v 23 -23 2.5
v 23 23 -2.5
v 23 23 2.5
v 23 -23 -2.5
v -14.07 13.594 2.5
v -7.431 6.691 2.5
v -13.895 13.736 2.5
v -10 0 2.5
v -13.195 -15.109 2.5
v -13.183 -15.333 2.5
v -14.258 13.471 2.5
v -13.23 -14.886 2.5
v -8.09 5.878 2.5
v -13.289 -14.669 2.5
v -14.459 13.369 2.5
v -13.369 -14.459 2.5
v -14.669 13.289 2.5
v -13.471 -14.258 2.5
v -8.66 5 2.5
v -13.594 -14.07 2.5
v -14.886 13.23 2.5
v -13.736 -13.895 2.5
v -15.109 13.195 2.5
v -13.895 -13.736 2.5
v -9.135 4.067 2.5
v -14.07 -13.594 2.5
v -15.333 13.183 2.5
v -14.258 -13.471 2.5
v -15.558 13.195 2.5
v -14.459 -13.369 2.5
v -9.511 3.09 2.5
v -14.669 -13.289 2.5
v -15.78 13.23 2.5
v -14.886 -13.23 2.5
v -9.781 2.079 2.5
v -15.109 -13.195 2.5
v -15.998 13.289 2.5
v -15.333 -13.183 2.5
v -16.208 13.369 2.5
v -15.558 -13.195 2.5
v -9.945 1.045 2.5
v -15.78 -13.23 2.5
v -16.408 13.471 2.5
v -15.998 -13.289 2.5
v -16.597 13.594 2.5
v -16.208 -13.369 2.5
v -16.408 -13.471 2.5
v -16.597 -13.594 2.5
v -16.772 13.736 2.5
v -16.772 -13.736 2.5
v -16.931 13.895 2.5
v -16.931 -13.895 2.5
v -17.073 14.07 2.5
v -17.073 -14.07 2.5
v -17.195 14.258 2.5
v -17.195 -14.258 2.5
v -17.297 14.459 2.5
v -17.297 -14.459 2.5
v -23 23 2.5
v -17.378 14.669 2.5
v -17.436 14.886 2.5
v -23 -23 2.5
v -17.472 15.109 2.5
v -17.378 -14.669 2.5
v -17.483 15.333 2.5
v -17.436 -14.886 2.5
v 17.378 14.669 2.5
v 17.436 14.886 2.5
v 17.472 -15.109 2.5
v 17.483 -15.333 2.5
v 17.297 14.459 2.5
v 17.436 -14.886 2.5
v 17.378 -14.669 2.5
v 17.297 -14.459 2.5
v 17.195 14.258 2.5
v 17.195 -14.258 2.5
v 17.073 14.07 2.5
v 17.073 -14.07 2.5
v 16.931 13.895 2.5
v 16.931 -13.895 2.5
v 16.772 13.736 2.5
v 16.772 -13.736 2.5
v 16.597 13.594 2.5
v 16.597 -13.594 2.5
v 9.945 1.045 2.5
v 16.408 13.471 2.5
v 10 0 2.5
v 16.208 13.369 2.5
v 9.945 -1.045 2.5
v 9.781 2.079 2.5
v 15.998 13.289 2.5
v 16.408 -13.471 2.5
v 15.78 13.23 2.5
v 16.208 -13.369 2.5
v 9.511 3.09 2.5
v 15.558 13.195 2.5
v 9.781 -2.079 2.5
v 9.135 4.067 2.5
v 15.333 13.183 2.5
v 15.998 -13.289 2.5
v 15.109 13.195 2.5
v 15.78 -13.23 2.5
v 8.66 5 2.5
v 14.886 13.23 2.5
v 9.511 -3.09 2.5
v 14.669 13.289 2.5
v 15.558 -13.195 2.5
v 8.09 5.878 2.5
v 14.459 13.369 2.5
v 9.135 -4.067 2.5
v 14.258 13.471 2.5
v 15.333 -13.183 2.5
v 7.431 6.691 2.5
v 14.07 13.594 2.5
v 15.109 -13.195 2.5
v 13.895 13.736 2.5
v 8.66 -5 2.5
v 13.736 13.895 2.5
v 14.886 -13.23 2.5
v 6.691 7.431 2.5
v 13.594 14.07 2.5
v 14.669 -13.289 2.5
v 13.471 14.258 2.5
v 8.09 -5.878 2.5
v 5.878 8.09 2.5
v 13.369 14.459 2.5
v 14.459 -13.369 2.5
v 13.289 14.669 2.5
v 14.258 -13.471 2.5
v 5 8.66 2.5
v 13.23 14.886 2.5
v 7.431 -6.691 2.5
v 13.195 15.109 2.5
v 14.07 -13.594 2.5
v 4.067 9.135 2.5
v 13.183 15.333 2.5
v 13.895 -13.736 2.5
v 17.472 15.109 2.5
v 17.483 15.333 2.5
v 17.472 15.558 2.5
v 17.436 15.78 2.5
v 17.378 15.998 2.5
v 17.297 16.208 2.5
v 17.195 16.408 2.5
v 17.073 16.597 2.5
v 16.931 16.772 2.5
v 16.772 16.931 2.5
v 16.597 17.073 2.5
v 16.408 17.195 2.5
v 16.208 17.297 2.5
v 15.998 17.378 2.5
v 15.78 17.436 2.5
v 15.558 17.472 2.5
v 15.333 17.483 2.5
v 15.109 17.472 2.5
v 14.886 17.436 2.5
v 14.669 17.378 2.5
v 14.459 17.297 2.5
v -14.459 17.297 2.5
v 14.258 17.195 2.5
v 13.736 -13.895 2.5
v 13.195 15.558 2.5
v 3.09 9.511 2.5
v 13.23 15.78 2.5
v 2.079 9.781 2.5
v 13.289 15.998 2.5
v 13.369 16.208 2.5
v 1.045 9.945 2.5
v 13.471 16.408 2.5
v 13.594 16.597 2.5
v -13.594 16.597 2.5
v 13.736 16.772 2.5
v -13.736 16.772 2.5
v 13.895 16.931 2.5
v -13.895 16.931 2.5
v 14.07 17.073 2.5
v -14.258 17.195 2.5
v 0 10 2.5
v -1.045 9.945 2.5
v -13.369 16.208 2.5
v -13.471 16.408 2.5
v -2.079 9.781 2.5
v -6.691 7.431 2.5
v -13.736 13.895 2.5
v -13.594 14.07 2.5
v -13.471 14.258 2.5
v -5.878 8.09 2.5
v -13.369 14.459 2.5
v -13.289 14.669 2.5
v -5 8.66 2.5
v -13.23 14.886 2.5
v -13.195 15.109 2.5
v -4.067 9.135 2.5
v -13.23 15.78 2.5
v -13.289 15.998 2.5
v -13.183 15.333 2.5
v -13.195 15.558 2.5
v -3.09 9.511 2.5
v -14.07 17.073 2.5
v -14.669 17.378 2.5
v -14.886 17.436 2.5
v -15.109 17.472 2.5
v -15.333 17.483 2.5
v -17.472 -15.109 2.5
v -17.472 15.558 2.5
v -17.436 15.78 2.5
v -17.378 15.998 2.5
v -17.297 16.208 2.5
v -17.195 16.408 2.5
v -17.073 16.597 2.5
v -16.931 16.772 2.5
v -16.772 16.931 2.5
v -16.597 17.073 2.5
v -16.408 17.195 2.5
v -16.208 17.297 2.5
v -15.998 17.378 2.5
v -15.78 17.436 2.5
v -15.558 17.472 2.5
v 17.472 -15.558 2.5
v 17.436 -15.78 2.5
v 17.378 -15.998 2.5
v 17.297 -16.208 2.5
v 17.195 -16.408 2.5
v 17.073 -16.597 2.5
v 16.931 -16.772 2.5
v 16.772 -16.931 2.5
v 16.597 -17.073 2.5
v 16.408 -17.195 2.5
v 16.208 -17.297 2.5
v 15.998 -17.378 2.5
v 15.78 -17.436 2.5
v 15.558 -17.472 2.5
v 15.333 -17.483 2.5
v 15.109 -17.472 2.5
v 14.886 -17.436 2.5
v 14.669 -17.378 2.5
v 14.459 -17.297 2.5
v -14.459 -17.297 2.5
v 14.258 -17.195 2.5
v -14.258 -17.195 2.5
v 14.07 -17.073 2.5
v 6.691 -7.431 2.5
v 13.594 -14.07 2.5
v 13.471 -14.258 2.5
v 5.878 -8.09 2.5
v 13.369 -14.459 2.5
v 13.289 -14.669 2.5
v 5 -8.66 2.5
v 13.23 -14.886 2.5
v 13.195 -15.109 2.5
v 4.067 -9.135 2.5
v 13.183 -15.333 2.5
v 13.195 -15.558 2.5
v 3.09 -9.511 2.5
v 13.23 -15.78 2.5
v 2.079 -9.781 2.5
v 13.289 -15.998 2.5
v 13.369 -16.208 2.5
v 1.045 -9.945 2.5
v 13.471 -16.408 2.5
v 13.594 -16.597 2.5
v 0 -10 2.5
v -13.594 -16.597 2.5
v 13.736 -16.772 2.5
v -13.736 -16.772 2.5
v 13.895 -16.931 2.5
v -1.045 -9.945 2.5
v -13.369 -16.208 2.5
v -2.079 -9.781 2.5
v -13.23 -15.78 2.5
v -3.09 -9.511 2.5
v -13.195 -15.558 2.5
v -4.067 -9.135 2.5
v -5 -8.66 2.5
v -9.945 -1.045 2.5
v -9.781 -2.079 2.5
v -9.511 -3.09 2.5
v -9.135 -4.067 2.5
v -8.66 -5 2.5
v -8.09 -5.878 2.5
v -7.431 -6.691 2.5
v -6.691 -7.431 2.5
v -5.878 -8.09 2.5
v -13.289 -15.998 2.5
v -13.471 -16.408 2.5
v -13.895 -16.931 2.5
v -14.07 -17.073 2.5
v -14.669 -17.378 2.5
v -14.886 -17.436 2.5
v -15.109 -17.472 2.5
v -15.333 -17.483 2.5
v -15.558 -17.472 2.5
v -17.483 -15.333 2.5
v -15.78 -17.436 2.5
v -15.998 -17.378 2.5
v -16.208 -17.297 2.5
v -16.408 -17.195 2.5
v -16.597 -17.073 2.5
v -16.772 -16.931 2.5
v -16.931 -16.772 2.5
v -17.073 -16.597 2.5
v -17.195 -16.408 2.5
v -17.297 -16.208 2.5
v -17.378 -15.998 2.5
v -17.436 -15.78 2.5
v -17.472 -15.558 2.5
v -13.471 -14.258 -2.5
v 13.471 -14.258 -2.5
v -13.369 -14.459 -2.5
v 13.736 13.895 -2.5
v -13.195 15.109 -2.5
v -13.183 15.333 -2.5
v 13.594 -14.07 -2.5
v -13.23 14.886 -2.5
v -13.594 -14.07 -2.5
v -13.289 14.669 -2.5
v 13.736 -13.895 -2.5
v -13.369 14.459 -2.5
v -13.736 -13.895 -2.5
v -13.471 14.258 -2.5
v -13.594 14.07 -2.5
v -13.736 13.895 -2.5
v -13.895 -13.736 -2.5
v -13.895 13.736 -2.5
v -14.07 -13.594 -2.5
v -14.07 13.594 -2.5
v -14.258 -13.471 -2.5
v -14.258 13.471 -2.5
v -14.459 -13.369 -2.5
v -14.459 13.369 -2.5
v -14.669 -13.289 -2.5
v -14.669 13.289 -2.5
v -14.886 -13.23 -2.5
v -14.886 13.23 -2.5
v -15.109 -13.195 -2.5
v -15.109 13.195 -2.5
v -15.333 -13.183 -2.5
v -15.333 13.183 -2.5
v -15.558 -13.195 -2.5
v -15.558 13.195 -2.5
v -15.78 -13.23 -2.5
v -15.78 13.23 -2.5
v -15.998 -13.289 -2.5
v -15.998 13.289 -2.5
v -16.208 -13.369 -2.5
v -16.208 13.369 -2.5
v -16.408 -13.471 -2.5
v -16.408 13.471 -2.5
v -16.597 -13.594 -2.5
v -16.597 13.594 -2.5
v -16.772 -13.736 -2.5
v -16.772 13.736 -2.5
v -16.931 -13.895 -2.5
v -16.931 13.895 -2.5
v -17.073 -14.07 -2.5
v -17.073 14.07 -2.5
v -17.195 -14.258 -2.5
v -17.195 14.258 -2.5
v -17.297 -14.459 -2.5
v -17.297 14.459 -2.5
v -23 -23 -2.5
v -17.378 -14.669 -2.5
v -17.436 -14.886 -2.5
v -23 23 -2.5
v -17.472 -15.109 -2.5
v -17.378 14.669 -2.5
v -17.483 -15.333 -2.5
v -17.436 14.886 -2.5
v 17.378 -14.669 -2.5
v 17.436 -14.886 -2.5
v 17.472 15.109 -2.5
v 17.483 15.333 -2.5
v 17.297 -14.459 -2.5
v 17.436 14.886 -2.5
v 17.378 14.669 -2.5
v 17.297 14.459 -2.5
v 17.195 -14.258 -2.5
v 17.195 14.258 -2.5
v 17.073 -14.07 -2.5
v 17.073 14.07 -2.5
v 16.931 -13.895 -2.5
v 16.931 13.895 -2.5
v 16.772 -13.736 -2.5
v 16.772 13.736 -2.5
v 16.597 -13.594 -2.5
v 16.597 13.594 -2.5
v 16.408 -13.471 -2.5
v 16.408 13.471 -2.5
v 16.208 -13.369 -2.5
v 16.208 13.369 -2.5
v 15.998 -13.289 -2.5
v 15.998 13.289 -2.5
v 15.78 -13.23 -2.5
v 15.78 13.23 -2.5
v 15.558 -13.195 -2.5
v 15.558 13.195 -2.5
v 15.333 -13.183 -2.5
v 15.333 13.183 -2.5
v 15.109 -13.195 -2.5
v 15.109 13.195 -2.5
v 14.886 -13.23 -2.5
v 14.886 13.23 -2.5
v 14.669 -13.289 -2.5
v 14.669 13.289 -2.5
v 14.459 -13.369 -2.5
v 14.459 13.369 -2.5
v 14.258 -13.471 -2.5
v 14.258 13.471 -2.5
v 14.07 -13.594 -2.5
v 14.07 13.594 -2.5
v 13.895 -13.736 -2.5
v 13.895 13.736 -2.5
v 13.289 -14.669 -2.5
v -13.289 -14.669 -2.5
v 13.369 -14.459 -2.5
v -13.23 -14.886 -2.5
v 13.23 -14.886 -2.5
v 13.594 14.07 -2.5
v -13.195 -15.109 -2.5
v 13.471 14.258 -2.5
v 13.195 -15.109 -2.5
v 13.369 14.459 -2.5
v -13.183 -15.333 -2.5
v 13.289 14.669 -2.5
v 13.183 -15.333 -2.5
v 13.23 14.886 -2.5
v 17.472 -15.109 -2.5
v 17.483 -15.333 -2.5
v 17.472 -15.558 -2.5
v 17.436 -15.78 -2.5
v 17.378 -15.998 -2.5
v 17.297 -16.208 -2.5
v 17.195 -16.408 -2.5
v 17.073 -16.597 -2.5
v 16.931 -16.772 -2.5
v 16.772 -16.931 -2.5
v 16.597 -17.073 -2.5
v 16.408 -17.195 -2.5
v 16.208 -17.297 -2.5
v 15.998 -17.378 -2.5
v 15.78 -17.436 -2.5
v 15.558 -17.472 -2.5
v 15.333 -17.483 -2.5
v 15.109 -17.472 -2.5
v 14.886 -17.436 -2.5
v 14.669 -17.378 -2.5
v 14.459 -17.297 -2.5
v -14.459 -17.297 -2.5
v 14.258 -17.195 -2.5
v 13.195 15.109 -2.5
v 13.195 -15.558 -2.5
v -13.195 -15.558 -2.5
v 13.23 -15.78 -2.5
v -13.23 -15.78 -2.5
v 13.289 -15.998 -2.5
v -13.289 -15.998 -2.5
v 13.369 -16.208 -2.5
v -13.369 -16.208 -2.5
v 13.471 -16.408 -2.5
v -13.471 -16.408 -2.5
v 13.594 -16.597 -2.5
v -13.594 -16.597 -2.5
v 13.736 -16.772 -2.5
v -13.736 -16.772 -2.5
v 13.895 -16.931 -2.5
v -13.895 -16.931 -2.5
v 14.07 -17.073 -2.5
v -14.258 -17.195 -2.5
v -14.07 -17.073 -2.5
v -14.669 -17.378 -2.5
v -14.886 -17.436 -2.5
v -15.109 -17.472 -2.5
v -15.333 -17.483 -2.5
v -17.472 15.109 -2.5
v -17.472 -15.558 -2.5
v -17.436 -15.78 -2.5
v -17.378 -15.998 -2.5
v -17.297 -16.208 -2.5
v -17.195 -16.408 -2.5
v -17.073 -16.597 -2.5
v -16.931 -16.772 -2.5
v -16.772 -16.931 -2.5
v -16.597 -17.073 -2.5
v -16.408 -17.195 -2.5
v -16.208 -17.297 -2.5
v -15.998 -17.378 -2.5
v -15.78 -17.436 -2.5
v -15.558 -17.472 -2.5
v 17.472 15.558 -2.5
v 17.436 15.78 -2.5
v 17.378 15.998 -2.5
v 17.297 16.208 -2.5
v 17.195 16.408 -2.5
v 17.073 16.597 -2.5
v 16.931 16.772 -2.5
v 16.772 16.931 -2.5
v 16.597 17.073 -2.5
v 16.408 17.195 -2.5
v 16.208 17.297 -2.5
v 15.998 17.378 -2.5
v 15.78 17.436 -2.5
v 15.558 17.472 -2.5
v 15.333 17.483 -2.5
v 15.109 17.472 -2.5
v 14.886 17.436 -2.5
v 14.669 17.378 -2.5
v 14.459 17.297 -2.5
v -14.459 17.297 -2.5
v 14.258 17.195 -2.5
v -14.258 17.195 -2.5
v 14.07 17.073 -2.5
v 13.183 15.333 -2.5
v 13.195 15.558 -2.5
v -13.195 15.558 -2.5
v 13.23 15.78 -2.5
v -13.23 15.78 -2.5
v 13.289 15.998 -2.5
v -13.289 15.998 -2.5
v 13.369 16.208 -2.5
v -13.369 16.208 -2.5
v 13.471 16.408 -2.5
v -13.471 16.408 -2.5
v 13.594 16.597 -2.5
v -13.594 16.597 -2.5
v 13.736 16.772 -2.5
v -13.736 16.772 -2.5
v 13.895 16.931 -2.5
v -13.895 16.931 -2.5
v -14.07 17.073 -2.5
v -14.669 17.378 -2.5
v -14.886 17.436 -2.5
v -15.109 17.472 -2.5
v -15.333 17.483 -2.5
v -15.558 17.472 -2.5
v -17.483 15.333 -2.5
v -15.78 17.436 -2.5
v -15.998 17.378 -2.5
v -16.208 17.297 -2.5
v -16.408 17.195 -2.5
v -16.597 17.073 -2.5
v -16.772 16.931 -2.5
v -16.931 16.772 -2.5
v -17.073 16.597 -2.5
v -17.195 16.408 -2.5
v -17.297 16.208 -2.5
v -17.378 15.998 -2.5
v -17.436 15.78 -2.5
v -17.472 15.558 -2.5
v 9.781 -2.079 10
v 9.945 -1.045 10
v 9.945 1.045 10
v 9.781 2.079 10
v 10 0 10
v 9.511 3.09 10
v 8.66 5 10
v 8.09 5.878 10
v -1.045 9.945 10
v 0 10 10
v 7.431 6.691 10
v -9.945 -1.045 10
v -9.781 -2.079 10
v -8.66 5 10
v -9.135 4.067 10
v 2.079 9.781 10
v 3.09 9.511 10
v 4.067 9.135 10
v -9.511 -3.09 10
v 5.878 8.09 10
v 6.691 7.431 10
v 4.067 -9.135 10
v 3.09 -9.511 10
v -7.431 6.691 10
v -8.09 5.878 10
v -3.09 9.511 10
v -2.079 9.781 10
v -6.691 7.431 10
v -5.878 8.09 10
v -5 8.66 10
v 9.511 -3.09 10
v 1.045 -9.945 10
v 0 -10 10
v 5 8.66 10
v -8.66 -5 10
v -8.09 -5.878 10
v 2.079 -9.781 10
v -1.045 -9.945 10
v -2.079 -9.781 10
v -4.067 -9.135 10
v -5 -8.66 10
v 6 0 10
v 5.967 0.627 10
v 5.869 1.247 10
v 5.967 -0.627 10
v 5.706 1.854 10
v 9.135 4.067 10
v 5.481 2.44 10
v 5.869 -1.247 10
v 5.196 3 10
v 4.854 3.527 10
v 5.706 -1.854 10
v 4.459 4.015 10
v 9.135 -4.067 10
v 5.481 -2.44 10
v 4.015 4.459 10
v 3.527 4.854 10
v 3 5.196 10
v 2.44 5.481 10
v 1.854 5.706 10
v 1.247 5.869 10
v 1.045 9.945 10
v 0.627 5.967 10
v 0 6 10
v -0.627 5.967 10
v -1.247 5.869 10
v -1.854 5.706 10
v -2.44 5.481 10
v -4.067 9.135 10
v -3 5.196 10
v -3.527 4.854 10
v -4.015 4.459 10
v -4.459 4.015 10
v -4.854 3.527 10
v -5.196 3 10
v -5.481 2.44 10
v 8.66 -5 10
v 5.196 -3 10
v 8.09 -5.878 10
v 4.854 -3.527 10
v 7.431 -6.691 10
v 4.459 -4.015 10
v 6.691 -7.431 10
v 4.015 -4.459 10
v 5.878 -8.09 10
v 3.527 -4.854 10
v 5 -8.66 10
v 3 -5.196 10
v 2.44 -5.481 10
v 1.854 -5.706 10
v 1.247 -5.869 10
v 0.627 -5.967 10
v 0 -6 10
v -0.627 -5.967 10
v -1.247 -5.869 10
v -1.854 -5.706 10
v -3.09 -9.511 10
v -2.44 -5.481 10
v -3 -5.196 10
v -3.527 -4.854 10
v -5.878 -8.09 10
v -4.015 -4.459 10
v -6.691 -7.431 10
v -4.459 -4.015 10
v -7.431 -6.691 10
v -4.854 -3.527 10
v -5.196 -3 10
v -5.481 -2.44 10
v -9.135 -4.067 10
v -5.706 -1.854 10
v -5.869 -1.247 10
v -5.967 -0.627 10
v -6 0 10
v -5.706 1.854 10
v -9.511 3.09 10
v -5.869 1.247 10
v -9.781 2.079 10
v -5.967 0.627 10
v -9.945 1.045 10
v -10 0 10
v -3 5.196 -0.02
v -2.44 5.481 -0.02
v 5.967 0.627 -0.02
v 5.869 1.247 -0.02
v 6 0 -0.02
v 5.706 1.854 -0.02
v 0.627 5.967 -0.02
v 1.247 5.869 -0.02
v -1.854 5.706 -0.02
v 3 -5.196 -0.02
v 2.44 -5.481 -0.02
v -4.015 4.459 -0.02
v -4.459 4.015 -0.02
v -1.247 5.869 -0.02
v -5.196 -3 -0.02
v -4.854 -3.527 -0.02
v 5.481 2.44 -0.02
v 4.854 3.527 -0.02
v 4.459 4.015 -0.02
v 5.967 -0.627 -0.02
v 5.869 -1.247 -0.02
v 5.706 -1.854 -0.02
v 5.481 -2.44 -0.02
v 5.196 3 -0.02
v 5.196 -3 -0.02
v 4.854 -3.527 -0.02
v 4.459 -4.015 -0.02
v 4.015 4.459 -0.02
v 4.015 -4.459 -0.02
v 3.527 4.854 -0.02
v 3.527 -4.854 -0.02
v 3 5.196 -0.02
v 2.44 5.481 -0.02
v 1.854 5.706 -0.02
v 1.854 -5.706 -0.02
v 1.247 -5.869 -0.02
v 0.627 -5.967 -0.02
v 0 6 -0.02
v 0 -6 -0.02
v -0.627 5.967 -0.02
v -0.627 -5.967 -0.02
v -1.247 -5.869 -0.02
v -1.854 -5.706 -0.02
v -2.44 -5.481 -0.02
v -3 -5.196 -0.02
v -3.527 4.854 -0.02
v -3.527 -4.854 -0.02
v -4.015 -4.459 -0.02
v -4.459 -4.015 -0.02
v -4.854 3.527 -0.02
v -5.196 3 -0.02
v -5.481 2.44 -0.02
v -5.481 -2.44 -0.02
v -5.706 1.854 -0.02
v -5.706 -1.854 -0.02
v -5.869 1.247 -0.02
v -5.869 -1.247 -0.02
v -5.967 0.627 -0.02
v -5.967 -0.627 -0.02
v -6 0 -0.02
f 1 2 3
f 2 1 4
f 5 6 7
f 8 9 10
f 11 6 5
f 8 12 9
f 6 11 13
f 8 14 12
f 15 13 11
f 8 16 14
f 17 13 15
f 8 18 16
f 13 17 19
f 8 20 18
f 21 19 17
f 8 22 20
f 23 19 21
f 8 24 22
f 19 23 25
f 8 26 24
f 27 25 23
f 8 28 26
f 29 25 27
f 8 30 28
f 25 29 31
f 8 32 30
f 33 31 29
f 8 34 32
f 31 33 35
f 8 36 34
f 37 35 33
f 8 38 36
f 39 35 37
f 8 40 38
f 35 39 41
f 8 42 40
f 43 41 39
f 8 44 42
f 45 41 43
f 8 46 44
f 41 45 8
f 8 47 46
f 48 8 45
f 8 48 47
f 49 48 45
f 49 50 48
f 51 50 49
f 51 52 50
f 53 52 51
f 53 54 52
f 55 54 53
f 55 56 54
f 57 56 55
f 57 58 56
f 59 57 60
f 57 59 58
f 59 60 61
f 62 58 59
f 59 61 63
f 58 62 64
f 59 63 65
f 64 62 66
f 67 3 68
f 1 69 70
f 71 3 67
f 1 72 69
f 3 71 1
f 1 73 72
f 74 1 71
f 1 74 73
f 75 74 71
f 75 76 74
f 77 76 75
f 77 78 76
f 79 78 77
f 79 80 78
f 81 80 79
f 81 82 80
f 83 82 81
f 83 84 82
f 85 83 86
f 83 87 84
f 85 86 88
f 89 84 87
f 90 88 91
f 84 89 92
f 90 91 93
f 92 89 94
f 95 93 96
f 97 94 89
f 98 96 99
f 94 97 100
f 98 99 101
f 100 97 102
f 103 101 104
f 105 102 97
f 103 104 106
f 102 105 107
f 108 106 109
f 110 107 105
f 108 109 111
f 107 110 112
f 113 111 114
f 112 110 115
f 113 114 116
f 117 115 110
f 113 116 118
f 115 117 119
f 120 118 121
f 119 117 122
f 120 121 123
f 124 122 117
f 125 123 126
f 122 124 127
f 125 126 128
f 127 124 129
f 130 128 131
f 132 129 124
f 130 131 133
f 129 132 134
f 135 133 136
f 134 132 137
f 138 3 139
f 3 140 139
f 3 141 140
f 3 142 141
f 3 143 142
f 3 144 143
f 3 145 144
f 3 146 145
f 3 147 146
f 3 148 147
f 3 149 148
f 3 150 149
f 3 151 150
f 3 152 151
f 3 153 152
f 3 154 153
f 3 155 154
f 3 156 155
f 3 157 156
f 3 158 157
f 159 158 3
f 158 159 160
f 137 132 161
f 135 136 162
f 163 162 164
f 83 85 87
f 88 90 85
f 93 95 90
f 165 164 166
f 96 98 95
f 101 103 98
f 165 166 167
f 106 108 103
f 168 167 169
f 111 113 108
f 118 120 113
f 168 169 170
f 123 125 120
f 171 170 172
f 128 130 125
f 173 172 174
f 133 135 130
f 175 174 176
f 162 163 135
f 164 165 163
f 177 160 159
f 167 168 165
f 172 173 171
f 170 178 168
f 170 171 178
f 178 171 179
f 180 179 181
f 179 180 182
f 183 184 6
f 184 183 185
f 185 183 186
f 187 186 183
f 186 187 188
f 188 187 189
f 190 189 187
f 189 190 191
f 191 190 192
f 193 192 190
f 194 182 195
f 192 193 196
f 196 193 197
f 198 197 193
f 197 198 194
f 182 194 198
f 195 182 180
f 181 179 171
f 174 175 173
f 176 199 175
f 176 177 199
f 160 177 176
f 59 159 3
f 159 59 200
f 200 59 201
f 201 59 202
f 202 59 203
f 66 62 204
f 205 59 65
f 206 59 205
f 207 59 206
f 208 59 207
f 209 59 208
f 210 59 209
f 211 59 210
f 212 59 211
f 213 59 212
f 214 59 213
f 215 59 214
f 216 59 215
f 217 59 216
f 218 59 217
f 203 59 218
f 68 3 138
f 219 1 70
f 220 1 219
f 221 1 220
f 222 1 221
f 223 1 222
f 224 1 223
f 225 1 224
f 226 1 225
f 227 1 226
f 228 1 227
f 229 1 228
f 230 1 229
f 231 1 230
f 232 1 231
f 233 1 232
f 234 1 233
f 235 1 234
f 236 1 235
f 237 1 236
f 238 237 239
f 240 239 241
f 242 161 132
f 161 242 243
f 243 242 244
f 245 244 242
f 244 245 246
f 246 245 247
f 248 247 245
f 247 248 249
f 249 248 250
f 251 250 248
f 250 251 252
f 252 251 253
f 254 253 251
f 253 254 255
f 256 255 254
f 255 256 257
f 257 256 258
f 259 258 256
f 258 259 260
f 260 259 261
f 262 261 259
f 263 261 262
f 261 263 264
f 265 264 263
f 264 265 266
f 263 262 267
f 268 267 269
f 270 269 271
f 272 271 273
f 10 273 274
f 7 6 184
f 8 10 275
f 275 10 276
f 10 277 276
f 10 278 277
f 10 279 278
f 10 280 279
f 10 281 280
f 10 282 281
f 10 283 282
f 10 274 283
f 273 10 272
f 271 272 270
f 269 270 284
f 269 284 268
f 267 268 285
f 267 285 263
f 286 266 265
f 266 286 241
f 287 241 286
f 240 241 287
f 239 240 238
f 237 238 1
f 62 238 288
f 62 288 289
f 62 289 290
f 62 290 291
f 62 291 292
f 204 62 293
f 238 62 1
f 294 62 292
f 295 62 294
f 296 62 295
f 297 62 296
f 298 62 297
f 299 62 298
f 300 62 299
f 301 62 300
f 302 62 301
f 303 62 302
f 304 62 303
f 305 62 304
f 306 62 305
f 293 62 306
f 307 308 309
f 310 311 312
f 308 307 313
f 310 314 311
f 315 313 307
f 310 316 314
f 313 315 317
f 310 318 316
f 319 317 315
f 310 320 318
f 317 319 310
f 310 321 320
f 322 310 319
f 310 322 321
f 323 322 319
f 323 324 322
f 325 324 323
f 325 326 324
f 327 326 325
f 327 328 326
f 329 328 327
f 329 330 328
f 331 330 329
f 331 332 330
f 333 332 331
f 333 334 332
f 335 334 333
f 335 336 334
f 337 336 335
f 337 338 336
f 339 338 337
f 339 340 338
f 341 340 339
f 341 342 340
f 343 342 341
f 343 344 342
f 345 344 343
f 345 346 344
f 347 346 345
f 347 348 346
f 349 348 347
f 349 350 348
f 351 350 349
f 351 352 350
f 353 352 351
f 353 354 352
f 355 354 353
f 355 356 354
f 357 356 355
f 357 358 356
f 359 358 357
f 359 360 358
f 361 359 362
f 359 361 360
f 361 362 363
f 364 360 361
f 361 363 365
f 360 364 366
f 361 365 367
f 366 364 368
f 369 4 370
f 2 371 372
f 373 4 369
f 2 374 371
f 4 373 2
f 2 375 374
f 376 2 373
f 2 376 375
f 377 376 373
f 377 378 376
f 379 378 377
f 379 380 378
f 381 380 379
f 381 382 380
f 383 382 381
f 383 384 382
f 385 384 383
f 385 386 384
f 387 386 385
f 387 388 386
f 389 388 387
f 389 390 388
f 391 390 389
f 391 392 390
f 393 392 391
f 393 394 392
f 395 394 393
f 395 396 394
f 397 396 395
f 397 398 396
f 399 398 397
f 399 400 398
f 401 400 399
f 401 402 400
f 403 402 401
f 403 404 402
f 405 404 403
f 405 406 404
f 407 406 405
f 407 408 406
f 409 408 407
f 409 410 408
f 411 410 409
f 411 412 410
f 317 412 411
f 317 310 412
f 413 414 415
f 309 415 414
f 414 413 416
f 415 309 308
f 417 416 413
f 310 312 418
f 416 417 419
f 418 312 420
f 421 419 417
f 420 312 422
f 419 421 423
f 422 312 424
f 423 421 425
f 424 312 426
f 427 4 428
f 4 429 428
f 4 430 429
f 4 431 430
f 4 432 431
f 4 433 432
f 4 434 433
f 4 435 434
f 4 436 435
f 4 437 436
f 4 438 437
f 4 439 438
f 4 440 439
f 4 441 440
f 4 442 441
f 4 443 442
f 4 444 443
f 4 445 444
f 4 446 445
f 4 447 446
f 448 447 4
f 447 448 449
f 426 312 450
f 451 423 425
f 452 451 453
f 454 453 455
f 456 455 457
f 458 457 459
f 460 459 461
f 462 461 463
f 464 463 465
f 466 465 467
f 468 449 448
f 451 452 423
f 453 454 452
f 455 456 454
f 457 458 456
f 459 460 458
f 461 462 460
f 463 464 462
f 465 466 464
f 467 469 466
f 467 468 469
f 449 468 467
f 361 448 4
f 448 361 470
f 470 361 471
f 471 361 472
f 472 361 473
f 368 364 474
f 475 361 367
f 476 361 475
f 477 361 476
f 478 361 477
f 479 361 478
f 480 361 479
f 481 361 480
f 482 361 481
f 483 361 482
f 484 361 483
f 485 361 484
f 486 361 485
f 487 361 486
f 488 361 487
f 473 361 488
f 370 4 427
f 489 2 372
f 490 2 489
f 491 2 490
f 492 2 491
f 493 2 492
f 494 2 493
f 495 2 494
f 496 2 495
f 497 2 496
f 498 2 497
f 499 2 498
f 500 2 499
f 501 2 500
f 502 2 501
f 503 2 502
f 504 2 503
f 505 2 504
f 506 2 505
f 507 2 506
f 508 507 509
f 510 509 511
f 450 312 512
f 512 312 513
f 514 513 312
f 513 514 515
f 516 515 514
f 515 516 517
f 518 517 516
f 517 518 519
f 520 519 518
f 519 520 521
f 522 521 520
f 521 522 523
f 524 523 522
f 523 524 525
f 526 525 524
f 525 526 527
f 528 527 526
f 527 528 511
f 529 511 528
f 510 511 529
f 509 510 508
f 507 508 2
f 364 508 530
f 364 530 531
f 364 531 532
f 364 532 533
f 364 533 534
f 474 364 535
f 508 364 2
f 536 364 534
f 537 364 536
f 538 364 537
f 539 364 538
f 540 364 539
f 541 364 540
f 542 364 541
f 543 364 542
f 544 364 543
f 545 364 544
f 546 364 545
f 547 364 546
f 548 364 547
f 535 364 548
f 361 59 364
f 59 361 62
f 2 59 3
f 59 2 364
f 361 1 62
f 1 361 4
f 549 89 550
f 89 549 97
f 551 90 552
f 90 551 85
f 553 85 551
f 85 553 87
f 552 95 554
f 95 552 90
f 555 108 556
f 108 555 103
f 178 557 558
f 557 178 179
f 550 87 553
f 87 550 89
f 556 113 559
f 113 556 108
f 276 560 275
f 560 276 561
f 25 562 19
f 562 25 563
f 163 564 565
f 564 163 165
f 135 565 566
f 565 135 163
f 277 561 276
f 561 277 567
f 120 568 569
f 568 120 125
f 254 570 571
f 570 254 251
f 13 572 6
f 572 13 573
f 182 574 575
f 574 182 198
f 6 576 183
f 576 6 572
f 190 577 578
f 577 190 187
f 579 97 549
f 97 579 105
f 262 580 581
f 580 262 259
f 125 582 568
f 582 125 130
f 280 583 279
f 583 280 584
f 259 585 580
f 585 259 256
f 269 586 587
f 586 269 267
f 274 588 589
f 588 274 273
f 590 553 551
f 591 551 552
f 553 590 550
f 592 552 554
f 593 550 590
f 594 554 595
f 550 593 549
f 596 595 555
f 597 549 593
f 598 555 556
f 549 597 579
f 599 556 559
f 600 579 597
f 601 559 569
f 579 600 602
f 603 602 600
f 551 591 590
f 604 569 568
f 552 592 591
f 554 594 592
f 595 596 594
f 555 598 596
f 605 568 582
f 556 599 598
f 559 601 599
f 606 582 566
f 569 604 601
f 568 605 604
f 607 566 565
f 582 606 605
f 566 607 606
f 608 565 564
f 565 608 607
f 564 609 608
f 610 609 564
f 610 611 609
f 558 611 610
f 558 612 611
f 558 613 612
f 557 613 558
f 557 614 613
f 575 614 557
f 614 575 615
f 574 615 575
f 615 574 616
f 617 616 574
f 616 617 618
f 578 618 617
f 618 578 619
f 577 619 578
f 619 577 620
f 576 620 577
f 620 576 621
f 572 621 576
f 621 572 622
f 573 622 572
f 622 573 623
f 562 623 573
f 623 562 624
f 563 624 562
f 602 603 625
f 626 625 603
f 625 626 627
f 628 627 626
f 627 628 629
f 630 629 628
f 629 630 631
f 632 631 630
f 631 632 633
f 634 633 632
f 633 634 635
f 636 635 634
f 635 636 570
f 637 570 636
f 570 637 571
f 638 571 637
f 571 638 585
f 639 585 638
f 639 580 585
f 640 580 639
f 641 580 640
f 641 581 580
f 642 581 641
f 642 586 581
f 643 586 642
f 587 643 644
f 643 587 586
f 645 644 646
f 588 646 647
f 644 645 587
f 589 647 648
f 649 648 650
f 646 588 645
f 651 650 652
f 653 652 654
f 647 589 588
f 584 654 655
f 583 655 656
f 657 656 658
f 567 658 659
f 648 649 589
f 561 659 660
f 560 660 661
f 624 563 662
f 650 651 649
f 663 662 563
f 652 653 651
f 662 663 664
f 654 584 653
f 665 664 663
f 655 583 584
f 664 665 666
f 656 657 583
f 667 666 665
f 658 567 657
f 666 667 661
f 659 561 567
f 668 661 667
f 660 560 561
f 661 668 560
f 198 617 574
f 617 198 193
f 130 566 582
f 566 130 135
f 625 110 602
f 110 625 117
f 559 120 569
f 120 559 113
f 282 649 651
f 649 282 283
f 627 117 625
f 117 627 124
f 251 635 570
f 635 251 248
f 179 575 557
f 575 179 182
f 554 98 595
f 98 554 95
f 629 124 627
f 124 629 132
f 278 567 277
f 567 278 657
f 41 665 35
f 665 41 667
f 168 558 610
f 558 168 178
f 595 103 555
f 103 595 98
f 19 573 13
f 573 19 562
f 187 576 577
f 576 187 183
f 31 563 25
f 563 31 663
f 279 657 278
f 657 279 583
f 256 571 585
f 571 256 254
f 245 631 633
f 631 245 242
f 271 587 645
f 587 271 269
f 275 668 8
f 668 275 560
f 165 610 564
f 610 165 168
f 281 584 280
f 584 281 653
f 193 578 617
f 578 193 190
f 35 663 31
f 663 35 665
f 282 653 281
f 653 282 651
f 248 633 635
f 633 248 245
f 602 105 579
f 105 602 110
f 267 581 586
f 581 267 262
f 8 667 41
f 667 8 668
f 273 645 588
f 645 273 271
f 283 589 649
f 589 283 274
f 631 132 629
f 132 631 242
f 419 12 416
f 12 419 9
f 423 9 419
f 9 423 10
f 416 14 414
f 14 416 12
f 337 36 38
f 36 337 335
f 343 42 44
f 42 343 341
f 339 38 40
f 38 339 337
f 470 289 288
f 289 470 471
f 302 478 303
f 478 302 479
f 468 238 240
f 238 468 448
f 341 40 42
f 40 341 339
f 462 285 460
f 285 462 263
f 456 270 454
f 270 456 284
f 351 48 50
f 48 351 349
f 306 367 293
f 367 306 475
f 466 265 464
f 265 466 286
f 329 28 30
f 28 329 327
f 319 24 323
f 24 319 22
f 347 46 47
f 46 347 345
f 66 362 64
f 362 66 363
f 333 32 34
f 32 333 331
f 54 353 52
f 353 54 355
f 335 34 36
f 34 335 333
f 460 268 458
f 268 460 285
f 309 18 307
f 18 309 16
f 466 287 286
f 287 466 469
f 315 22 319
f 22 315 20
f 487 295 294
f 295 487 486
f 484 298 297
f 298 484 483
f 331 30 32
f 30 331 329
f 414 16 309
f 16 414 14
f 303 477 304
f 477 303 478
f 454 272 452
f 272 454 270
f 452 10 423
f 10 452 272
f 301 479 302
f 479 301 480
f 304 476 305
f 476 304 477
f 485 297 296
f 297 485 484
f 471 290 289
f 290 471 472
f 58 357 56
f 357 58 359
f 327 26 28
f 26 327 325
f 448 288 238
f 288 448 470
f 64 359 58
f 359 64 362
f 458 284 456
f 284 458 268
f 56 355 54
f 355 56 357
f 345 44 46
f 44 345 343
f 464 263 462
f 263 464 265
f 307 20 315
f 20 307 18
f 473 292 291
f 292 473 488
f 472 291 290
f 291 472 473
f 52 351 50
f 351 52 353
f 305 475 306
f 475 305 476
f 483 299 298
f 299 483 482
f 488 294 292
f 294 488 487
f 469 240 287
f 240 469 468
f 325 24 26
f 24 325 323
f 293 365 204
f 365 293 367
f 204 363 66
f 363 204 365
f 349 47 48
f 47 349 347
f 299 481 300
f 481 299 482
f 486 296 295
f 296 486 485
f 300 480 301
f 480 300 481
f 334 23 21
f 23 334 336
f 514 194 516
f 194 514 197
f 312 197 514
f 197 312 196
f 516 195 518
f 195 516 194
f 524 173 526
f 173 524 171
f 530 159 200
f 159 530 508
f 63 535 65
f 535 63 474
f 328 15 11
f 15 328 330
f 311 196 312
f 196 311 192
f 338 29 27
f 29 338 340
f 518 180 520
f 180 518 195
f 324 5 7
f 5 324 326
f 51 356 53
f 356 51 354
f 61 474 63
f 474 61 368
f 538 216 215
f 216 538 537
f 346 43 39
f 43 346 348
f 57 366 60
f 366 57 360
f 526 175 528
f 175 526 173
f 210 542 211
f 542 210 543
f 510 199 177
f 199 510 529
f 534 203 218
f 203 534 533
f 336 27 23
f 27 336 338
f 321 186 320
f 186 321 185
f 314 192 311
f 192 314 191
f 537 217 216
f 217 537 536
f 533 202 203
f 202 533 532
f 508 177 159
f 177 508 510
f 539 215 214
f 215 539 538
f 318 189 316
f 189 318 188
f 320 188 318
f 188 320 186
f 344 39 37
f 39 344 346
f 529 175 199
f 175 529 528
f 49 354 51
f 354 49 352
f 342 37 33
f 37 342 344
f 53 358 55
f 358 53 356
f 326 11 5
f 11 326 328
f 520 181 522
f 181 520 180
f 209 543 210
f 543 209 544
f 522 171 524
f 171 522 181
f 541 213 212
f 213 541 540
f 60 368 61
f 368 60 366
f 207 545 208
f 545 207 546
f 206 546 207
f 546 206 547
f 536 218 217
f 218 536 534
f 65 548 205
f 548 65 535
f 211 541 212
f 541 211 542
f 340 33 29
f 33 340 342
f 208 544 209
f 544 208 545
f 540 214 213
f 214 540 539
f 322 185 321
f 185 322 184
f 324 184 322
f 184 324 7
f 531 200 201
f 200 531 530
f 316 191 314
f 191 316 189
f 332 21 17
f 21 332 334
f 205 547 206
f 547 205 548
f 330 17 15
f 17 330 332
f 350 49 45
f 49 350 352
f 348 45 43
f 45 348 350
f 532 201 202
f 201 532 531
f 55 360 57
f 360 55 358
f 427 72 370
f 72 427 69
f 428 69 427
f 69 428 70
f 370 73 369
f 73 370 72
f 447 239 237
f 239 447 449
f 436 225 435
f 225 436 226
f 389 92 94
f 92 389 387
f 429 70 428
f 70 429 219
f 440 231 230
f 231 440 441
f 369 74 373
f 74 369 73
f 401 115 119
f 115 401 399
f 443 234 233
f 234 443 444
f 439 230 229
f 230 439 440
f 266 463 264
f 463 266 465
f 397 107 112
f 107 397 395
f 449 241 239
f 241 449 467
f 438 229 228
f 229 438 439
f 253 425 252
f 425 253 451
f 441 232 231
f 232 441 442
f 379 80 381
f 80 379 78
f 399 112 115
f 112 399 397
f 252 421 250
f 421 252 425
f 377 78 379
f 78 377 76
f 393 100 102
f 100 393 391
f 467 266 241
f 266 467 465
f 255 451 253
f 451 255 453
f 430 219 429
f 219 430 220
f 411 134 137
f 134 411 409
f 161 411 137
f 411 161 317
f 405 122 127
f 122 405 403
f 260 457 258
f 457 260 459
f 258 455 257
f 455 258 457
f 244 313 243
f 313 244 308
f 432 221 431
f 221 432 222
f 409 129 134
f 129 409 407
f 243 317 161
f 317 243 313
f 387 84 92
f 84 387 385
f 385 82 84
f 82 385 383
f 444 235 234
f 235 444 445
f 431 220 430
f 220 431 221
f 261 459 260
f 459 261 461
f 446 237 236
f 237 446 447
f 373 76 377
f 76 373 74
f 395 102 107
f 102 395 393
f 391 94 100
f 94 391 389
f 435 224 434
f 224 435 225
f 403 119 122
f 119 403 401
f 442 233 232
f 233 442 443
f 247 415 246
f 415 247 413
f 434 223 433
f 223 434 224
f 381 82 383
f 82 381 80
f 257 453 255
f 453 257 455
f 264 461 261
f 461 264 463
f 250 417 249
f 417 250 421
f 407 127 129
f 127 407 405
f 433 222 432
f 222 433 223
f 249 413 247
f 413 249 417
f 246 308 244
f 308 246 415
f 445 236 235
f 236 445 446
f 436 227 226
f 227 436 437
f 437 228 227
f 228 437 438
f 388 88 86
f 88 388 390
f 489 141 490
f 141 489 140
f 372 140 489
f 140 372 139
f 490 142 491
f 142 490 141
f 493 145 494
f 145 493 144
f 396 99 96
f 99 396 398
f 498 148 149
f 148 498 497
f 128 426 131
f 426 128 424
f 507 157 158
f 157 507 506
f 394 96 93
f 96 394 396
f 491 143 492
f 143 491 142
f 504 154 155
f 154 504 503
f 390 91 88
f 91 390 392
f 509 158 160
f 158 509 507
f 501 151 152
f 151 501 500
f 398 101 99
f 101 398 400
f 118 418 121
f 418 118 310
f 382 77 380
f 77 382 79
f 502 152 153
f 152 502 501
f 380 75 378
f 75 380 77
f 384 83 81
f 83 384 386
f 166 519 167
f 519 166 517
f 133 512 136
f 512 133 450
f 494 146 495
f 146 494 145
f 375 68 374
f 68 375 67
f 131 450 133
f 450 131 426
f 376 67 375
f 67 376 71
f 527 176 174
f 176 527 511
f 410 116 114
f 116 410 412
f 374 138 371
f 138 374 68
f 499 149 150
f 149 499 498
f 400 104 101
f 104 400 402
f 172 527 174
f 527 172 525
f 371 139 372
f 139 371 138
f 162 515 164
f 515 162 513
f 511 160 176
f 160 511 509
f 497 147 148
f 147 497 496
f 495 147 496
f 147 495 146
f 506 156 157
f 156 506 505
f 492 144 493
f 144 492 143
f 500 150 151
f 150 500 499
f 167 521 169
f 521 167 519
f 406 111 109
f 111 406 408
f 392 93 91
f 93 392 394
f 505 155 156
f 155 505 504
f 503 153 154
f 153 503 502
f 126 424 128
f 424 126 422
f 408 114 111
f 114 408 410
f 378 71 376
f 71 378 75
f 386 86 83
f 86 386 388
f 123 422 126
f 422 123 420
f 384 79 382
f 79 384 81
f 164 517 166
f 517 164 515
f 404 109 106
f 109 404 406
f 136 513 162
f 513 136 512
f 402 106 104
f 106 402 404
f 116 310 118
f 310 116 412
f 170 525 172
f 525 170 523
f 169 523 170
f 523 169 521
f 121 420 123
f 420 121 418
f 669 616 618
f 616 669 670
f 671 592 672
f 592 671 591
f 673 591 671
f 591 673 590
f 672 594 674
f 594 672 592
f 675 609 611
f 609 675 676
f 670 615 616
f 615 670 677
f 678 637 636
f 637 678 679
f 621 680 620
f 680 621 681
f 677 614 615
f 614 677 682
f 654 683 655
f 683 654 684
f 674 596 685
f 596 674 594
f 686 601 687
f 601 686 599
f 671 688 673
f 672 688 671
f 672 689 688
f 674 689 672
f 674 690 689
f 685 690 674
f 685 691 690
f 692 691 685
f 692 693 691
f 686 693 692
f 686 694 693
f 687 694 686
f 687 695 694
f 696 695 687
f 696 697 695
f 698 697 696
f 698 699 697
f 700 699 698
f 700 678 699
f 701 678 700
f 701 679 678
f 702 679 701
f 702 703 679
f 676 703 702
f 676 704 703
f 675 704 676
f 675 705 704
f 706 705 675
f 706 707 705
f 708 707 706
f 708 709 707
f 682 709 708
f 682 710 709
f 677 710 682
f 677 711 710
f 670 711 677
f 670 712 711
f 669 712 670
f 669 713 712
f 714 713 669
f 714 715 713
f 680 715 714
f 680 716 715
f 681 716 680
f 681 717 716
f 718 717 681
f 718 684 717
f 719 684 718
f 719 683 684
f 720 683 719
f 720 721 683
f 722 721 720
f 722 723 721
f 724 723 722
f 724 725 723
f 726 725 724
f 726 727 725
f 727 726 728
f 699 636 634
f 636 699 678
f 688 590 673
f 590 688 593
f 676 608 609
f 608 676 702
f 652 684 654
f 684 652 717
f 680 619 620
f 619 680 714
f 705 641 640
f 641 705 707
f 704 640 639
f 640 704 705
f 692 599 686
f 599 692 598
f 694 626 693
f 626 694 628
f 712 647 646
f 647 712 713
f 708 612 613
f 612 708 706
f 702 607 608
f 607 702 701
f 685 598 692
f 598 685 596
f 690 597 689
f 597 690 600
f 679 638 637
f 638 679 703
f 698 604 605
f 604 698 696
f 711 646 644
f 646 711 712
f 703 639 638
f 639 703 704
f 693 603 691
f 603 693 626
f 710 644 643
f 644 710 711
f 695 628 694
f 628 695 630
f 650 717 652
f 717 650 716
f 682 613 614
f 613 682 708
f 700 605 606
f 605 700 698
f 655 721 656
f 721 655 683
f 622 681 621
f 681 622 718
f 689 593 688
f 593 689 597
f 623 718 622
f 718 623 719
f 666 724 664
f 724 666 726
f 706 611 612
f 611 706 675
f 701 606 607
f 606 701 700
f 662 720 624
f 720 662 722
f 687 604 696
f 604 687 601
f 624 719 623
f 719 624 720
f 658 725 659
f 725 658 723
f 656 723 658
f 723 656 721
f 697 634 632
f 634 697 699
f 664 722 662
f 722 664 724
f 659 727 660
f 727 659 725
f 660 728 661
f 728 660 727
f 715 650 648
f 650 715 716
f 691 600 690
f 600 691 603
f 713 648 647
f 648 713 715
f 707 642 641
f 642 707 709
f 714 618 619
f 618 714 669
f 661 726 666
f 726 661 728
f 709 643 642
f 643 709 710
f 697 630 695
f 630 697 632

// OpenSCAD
// Flange bearing block for 12 mm bearing OD.
$fn = 60;
eps = 0.02;
bearing_d = 12;
plate_l = bearing_d + 34;
plate_t = 5;
hub_h = bearing_d / 2 + 4;
difference() {
    union() {
        cube([plate_l, plate_l, plate_t], center = true);
        cylinder(d = bearing_d + 8, h = hub_h);
    }
    translate([0, 0, -eps]) cylinder(d = bearing_d, h = hub_h + 2 * eps);
    for (x = [-plate_l / 3, plate_l / 3], y = [-plate_l / 3, plate_l / 3])
        translate([x, y, -plate_t / 2 - eps]) cylinder(d = 4.3, h = plate_t + 2 * eps);
}
